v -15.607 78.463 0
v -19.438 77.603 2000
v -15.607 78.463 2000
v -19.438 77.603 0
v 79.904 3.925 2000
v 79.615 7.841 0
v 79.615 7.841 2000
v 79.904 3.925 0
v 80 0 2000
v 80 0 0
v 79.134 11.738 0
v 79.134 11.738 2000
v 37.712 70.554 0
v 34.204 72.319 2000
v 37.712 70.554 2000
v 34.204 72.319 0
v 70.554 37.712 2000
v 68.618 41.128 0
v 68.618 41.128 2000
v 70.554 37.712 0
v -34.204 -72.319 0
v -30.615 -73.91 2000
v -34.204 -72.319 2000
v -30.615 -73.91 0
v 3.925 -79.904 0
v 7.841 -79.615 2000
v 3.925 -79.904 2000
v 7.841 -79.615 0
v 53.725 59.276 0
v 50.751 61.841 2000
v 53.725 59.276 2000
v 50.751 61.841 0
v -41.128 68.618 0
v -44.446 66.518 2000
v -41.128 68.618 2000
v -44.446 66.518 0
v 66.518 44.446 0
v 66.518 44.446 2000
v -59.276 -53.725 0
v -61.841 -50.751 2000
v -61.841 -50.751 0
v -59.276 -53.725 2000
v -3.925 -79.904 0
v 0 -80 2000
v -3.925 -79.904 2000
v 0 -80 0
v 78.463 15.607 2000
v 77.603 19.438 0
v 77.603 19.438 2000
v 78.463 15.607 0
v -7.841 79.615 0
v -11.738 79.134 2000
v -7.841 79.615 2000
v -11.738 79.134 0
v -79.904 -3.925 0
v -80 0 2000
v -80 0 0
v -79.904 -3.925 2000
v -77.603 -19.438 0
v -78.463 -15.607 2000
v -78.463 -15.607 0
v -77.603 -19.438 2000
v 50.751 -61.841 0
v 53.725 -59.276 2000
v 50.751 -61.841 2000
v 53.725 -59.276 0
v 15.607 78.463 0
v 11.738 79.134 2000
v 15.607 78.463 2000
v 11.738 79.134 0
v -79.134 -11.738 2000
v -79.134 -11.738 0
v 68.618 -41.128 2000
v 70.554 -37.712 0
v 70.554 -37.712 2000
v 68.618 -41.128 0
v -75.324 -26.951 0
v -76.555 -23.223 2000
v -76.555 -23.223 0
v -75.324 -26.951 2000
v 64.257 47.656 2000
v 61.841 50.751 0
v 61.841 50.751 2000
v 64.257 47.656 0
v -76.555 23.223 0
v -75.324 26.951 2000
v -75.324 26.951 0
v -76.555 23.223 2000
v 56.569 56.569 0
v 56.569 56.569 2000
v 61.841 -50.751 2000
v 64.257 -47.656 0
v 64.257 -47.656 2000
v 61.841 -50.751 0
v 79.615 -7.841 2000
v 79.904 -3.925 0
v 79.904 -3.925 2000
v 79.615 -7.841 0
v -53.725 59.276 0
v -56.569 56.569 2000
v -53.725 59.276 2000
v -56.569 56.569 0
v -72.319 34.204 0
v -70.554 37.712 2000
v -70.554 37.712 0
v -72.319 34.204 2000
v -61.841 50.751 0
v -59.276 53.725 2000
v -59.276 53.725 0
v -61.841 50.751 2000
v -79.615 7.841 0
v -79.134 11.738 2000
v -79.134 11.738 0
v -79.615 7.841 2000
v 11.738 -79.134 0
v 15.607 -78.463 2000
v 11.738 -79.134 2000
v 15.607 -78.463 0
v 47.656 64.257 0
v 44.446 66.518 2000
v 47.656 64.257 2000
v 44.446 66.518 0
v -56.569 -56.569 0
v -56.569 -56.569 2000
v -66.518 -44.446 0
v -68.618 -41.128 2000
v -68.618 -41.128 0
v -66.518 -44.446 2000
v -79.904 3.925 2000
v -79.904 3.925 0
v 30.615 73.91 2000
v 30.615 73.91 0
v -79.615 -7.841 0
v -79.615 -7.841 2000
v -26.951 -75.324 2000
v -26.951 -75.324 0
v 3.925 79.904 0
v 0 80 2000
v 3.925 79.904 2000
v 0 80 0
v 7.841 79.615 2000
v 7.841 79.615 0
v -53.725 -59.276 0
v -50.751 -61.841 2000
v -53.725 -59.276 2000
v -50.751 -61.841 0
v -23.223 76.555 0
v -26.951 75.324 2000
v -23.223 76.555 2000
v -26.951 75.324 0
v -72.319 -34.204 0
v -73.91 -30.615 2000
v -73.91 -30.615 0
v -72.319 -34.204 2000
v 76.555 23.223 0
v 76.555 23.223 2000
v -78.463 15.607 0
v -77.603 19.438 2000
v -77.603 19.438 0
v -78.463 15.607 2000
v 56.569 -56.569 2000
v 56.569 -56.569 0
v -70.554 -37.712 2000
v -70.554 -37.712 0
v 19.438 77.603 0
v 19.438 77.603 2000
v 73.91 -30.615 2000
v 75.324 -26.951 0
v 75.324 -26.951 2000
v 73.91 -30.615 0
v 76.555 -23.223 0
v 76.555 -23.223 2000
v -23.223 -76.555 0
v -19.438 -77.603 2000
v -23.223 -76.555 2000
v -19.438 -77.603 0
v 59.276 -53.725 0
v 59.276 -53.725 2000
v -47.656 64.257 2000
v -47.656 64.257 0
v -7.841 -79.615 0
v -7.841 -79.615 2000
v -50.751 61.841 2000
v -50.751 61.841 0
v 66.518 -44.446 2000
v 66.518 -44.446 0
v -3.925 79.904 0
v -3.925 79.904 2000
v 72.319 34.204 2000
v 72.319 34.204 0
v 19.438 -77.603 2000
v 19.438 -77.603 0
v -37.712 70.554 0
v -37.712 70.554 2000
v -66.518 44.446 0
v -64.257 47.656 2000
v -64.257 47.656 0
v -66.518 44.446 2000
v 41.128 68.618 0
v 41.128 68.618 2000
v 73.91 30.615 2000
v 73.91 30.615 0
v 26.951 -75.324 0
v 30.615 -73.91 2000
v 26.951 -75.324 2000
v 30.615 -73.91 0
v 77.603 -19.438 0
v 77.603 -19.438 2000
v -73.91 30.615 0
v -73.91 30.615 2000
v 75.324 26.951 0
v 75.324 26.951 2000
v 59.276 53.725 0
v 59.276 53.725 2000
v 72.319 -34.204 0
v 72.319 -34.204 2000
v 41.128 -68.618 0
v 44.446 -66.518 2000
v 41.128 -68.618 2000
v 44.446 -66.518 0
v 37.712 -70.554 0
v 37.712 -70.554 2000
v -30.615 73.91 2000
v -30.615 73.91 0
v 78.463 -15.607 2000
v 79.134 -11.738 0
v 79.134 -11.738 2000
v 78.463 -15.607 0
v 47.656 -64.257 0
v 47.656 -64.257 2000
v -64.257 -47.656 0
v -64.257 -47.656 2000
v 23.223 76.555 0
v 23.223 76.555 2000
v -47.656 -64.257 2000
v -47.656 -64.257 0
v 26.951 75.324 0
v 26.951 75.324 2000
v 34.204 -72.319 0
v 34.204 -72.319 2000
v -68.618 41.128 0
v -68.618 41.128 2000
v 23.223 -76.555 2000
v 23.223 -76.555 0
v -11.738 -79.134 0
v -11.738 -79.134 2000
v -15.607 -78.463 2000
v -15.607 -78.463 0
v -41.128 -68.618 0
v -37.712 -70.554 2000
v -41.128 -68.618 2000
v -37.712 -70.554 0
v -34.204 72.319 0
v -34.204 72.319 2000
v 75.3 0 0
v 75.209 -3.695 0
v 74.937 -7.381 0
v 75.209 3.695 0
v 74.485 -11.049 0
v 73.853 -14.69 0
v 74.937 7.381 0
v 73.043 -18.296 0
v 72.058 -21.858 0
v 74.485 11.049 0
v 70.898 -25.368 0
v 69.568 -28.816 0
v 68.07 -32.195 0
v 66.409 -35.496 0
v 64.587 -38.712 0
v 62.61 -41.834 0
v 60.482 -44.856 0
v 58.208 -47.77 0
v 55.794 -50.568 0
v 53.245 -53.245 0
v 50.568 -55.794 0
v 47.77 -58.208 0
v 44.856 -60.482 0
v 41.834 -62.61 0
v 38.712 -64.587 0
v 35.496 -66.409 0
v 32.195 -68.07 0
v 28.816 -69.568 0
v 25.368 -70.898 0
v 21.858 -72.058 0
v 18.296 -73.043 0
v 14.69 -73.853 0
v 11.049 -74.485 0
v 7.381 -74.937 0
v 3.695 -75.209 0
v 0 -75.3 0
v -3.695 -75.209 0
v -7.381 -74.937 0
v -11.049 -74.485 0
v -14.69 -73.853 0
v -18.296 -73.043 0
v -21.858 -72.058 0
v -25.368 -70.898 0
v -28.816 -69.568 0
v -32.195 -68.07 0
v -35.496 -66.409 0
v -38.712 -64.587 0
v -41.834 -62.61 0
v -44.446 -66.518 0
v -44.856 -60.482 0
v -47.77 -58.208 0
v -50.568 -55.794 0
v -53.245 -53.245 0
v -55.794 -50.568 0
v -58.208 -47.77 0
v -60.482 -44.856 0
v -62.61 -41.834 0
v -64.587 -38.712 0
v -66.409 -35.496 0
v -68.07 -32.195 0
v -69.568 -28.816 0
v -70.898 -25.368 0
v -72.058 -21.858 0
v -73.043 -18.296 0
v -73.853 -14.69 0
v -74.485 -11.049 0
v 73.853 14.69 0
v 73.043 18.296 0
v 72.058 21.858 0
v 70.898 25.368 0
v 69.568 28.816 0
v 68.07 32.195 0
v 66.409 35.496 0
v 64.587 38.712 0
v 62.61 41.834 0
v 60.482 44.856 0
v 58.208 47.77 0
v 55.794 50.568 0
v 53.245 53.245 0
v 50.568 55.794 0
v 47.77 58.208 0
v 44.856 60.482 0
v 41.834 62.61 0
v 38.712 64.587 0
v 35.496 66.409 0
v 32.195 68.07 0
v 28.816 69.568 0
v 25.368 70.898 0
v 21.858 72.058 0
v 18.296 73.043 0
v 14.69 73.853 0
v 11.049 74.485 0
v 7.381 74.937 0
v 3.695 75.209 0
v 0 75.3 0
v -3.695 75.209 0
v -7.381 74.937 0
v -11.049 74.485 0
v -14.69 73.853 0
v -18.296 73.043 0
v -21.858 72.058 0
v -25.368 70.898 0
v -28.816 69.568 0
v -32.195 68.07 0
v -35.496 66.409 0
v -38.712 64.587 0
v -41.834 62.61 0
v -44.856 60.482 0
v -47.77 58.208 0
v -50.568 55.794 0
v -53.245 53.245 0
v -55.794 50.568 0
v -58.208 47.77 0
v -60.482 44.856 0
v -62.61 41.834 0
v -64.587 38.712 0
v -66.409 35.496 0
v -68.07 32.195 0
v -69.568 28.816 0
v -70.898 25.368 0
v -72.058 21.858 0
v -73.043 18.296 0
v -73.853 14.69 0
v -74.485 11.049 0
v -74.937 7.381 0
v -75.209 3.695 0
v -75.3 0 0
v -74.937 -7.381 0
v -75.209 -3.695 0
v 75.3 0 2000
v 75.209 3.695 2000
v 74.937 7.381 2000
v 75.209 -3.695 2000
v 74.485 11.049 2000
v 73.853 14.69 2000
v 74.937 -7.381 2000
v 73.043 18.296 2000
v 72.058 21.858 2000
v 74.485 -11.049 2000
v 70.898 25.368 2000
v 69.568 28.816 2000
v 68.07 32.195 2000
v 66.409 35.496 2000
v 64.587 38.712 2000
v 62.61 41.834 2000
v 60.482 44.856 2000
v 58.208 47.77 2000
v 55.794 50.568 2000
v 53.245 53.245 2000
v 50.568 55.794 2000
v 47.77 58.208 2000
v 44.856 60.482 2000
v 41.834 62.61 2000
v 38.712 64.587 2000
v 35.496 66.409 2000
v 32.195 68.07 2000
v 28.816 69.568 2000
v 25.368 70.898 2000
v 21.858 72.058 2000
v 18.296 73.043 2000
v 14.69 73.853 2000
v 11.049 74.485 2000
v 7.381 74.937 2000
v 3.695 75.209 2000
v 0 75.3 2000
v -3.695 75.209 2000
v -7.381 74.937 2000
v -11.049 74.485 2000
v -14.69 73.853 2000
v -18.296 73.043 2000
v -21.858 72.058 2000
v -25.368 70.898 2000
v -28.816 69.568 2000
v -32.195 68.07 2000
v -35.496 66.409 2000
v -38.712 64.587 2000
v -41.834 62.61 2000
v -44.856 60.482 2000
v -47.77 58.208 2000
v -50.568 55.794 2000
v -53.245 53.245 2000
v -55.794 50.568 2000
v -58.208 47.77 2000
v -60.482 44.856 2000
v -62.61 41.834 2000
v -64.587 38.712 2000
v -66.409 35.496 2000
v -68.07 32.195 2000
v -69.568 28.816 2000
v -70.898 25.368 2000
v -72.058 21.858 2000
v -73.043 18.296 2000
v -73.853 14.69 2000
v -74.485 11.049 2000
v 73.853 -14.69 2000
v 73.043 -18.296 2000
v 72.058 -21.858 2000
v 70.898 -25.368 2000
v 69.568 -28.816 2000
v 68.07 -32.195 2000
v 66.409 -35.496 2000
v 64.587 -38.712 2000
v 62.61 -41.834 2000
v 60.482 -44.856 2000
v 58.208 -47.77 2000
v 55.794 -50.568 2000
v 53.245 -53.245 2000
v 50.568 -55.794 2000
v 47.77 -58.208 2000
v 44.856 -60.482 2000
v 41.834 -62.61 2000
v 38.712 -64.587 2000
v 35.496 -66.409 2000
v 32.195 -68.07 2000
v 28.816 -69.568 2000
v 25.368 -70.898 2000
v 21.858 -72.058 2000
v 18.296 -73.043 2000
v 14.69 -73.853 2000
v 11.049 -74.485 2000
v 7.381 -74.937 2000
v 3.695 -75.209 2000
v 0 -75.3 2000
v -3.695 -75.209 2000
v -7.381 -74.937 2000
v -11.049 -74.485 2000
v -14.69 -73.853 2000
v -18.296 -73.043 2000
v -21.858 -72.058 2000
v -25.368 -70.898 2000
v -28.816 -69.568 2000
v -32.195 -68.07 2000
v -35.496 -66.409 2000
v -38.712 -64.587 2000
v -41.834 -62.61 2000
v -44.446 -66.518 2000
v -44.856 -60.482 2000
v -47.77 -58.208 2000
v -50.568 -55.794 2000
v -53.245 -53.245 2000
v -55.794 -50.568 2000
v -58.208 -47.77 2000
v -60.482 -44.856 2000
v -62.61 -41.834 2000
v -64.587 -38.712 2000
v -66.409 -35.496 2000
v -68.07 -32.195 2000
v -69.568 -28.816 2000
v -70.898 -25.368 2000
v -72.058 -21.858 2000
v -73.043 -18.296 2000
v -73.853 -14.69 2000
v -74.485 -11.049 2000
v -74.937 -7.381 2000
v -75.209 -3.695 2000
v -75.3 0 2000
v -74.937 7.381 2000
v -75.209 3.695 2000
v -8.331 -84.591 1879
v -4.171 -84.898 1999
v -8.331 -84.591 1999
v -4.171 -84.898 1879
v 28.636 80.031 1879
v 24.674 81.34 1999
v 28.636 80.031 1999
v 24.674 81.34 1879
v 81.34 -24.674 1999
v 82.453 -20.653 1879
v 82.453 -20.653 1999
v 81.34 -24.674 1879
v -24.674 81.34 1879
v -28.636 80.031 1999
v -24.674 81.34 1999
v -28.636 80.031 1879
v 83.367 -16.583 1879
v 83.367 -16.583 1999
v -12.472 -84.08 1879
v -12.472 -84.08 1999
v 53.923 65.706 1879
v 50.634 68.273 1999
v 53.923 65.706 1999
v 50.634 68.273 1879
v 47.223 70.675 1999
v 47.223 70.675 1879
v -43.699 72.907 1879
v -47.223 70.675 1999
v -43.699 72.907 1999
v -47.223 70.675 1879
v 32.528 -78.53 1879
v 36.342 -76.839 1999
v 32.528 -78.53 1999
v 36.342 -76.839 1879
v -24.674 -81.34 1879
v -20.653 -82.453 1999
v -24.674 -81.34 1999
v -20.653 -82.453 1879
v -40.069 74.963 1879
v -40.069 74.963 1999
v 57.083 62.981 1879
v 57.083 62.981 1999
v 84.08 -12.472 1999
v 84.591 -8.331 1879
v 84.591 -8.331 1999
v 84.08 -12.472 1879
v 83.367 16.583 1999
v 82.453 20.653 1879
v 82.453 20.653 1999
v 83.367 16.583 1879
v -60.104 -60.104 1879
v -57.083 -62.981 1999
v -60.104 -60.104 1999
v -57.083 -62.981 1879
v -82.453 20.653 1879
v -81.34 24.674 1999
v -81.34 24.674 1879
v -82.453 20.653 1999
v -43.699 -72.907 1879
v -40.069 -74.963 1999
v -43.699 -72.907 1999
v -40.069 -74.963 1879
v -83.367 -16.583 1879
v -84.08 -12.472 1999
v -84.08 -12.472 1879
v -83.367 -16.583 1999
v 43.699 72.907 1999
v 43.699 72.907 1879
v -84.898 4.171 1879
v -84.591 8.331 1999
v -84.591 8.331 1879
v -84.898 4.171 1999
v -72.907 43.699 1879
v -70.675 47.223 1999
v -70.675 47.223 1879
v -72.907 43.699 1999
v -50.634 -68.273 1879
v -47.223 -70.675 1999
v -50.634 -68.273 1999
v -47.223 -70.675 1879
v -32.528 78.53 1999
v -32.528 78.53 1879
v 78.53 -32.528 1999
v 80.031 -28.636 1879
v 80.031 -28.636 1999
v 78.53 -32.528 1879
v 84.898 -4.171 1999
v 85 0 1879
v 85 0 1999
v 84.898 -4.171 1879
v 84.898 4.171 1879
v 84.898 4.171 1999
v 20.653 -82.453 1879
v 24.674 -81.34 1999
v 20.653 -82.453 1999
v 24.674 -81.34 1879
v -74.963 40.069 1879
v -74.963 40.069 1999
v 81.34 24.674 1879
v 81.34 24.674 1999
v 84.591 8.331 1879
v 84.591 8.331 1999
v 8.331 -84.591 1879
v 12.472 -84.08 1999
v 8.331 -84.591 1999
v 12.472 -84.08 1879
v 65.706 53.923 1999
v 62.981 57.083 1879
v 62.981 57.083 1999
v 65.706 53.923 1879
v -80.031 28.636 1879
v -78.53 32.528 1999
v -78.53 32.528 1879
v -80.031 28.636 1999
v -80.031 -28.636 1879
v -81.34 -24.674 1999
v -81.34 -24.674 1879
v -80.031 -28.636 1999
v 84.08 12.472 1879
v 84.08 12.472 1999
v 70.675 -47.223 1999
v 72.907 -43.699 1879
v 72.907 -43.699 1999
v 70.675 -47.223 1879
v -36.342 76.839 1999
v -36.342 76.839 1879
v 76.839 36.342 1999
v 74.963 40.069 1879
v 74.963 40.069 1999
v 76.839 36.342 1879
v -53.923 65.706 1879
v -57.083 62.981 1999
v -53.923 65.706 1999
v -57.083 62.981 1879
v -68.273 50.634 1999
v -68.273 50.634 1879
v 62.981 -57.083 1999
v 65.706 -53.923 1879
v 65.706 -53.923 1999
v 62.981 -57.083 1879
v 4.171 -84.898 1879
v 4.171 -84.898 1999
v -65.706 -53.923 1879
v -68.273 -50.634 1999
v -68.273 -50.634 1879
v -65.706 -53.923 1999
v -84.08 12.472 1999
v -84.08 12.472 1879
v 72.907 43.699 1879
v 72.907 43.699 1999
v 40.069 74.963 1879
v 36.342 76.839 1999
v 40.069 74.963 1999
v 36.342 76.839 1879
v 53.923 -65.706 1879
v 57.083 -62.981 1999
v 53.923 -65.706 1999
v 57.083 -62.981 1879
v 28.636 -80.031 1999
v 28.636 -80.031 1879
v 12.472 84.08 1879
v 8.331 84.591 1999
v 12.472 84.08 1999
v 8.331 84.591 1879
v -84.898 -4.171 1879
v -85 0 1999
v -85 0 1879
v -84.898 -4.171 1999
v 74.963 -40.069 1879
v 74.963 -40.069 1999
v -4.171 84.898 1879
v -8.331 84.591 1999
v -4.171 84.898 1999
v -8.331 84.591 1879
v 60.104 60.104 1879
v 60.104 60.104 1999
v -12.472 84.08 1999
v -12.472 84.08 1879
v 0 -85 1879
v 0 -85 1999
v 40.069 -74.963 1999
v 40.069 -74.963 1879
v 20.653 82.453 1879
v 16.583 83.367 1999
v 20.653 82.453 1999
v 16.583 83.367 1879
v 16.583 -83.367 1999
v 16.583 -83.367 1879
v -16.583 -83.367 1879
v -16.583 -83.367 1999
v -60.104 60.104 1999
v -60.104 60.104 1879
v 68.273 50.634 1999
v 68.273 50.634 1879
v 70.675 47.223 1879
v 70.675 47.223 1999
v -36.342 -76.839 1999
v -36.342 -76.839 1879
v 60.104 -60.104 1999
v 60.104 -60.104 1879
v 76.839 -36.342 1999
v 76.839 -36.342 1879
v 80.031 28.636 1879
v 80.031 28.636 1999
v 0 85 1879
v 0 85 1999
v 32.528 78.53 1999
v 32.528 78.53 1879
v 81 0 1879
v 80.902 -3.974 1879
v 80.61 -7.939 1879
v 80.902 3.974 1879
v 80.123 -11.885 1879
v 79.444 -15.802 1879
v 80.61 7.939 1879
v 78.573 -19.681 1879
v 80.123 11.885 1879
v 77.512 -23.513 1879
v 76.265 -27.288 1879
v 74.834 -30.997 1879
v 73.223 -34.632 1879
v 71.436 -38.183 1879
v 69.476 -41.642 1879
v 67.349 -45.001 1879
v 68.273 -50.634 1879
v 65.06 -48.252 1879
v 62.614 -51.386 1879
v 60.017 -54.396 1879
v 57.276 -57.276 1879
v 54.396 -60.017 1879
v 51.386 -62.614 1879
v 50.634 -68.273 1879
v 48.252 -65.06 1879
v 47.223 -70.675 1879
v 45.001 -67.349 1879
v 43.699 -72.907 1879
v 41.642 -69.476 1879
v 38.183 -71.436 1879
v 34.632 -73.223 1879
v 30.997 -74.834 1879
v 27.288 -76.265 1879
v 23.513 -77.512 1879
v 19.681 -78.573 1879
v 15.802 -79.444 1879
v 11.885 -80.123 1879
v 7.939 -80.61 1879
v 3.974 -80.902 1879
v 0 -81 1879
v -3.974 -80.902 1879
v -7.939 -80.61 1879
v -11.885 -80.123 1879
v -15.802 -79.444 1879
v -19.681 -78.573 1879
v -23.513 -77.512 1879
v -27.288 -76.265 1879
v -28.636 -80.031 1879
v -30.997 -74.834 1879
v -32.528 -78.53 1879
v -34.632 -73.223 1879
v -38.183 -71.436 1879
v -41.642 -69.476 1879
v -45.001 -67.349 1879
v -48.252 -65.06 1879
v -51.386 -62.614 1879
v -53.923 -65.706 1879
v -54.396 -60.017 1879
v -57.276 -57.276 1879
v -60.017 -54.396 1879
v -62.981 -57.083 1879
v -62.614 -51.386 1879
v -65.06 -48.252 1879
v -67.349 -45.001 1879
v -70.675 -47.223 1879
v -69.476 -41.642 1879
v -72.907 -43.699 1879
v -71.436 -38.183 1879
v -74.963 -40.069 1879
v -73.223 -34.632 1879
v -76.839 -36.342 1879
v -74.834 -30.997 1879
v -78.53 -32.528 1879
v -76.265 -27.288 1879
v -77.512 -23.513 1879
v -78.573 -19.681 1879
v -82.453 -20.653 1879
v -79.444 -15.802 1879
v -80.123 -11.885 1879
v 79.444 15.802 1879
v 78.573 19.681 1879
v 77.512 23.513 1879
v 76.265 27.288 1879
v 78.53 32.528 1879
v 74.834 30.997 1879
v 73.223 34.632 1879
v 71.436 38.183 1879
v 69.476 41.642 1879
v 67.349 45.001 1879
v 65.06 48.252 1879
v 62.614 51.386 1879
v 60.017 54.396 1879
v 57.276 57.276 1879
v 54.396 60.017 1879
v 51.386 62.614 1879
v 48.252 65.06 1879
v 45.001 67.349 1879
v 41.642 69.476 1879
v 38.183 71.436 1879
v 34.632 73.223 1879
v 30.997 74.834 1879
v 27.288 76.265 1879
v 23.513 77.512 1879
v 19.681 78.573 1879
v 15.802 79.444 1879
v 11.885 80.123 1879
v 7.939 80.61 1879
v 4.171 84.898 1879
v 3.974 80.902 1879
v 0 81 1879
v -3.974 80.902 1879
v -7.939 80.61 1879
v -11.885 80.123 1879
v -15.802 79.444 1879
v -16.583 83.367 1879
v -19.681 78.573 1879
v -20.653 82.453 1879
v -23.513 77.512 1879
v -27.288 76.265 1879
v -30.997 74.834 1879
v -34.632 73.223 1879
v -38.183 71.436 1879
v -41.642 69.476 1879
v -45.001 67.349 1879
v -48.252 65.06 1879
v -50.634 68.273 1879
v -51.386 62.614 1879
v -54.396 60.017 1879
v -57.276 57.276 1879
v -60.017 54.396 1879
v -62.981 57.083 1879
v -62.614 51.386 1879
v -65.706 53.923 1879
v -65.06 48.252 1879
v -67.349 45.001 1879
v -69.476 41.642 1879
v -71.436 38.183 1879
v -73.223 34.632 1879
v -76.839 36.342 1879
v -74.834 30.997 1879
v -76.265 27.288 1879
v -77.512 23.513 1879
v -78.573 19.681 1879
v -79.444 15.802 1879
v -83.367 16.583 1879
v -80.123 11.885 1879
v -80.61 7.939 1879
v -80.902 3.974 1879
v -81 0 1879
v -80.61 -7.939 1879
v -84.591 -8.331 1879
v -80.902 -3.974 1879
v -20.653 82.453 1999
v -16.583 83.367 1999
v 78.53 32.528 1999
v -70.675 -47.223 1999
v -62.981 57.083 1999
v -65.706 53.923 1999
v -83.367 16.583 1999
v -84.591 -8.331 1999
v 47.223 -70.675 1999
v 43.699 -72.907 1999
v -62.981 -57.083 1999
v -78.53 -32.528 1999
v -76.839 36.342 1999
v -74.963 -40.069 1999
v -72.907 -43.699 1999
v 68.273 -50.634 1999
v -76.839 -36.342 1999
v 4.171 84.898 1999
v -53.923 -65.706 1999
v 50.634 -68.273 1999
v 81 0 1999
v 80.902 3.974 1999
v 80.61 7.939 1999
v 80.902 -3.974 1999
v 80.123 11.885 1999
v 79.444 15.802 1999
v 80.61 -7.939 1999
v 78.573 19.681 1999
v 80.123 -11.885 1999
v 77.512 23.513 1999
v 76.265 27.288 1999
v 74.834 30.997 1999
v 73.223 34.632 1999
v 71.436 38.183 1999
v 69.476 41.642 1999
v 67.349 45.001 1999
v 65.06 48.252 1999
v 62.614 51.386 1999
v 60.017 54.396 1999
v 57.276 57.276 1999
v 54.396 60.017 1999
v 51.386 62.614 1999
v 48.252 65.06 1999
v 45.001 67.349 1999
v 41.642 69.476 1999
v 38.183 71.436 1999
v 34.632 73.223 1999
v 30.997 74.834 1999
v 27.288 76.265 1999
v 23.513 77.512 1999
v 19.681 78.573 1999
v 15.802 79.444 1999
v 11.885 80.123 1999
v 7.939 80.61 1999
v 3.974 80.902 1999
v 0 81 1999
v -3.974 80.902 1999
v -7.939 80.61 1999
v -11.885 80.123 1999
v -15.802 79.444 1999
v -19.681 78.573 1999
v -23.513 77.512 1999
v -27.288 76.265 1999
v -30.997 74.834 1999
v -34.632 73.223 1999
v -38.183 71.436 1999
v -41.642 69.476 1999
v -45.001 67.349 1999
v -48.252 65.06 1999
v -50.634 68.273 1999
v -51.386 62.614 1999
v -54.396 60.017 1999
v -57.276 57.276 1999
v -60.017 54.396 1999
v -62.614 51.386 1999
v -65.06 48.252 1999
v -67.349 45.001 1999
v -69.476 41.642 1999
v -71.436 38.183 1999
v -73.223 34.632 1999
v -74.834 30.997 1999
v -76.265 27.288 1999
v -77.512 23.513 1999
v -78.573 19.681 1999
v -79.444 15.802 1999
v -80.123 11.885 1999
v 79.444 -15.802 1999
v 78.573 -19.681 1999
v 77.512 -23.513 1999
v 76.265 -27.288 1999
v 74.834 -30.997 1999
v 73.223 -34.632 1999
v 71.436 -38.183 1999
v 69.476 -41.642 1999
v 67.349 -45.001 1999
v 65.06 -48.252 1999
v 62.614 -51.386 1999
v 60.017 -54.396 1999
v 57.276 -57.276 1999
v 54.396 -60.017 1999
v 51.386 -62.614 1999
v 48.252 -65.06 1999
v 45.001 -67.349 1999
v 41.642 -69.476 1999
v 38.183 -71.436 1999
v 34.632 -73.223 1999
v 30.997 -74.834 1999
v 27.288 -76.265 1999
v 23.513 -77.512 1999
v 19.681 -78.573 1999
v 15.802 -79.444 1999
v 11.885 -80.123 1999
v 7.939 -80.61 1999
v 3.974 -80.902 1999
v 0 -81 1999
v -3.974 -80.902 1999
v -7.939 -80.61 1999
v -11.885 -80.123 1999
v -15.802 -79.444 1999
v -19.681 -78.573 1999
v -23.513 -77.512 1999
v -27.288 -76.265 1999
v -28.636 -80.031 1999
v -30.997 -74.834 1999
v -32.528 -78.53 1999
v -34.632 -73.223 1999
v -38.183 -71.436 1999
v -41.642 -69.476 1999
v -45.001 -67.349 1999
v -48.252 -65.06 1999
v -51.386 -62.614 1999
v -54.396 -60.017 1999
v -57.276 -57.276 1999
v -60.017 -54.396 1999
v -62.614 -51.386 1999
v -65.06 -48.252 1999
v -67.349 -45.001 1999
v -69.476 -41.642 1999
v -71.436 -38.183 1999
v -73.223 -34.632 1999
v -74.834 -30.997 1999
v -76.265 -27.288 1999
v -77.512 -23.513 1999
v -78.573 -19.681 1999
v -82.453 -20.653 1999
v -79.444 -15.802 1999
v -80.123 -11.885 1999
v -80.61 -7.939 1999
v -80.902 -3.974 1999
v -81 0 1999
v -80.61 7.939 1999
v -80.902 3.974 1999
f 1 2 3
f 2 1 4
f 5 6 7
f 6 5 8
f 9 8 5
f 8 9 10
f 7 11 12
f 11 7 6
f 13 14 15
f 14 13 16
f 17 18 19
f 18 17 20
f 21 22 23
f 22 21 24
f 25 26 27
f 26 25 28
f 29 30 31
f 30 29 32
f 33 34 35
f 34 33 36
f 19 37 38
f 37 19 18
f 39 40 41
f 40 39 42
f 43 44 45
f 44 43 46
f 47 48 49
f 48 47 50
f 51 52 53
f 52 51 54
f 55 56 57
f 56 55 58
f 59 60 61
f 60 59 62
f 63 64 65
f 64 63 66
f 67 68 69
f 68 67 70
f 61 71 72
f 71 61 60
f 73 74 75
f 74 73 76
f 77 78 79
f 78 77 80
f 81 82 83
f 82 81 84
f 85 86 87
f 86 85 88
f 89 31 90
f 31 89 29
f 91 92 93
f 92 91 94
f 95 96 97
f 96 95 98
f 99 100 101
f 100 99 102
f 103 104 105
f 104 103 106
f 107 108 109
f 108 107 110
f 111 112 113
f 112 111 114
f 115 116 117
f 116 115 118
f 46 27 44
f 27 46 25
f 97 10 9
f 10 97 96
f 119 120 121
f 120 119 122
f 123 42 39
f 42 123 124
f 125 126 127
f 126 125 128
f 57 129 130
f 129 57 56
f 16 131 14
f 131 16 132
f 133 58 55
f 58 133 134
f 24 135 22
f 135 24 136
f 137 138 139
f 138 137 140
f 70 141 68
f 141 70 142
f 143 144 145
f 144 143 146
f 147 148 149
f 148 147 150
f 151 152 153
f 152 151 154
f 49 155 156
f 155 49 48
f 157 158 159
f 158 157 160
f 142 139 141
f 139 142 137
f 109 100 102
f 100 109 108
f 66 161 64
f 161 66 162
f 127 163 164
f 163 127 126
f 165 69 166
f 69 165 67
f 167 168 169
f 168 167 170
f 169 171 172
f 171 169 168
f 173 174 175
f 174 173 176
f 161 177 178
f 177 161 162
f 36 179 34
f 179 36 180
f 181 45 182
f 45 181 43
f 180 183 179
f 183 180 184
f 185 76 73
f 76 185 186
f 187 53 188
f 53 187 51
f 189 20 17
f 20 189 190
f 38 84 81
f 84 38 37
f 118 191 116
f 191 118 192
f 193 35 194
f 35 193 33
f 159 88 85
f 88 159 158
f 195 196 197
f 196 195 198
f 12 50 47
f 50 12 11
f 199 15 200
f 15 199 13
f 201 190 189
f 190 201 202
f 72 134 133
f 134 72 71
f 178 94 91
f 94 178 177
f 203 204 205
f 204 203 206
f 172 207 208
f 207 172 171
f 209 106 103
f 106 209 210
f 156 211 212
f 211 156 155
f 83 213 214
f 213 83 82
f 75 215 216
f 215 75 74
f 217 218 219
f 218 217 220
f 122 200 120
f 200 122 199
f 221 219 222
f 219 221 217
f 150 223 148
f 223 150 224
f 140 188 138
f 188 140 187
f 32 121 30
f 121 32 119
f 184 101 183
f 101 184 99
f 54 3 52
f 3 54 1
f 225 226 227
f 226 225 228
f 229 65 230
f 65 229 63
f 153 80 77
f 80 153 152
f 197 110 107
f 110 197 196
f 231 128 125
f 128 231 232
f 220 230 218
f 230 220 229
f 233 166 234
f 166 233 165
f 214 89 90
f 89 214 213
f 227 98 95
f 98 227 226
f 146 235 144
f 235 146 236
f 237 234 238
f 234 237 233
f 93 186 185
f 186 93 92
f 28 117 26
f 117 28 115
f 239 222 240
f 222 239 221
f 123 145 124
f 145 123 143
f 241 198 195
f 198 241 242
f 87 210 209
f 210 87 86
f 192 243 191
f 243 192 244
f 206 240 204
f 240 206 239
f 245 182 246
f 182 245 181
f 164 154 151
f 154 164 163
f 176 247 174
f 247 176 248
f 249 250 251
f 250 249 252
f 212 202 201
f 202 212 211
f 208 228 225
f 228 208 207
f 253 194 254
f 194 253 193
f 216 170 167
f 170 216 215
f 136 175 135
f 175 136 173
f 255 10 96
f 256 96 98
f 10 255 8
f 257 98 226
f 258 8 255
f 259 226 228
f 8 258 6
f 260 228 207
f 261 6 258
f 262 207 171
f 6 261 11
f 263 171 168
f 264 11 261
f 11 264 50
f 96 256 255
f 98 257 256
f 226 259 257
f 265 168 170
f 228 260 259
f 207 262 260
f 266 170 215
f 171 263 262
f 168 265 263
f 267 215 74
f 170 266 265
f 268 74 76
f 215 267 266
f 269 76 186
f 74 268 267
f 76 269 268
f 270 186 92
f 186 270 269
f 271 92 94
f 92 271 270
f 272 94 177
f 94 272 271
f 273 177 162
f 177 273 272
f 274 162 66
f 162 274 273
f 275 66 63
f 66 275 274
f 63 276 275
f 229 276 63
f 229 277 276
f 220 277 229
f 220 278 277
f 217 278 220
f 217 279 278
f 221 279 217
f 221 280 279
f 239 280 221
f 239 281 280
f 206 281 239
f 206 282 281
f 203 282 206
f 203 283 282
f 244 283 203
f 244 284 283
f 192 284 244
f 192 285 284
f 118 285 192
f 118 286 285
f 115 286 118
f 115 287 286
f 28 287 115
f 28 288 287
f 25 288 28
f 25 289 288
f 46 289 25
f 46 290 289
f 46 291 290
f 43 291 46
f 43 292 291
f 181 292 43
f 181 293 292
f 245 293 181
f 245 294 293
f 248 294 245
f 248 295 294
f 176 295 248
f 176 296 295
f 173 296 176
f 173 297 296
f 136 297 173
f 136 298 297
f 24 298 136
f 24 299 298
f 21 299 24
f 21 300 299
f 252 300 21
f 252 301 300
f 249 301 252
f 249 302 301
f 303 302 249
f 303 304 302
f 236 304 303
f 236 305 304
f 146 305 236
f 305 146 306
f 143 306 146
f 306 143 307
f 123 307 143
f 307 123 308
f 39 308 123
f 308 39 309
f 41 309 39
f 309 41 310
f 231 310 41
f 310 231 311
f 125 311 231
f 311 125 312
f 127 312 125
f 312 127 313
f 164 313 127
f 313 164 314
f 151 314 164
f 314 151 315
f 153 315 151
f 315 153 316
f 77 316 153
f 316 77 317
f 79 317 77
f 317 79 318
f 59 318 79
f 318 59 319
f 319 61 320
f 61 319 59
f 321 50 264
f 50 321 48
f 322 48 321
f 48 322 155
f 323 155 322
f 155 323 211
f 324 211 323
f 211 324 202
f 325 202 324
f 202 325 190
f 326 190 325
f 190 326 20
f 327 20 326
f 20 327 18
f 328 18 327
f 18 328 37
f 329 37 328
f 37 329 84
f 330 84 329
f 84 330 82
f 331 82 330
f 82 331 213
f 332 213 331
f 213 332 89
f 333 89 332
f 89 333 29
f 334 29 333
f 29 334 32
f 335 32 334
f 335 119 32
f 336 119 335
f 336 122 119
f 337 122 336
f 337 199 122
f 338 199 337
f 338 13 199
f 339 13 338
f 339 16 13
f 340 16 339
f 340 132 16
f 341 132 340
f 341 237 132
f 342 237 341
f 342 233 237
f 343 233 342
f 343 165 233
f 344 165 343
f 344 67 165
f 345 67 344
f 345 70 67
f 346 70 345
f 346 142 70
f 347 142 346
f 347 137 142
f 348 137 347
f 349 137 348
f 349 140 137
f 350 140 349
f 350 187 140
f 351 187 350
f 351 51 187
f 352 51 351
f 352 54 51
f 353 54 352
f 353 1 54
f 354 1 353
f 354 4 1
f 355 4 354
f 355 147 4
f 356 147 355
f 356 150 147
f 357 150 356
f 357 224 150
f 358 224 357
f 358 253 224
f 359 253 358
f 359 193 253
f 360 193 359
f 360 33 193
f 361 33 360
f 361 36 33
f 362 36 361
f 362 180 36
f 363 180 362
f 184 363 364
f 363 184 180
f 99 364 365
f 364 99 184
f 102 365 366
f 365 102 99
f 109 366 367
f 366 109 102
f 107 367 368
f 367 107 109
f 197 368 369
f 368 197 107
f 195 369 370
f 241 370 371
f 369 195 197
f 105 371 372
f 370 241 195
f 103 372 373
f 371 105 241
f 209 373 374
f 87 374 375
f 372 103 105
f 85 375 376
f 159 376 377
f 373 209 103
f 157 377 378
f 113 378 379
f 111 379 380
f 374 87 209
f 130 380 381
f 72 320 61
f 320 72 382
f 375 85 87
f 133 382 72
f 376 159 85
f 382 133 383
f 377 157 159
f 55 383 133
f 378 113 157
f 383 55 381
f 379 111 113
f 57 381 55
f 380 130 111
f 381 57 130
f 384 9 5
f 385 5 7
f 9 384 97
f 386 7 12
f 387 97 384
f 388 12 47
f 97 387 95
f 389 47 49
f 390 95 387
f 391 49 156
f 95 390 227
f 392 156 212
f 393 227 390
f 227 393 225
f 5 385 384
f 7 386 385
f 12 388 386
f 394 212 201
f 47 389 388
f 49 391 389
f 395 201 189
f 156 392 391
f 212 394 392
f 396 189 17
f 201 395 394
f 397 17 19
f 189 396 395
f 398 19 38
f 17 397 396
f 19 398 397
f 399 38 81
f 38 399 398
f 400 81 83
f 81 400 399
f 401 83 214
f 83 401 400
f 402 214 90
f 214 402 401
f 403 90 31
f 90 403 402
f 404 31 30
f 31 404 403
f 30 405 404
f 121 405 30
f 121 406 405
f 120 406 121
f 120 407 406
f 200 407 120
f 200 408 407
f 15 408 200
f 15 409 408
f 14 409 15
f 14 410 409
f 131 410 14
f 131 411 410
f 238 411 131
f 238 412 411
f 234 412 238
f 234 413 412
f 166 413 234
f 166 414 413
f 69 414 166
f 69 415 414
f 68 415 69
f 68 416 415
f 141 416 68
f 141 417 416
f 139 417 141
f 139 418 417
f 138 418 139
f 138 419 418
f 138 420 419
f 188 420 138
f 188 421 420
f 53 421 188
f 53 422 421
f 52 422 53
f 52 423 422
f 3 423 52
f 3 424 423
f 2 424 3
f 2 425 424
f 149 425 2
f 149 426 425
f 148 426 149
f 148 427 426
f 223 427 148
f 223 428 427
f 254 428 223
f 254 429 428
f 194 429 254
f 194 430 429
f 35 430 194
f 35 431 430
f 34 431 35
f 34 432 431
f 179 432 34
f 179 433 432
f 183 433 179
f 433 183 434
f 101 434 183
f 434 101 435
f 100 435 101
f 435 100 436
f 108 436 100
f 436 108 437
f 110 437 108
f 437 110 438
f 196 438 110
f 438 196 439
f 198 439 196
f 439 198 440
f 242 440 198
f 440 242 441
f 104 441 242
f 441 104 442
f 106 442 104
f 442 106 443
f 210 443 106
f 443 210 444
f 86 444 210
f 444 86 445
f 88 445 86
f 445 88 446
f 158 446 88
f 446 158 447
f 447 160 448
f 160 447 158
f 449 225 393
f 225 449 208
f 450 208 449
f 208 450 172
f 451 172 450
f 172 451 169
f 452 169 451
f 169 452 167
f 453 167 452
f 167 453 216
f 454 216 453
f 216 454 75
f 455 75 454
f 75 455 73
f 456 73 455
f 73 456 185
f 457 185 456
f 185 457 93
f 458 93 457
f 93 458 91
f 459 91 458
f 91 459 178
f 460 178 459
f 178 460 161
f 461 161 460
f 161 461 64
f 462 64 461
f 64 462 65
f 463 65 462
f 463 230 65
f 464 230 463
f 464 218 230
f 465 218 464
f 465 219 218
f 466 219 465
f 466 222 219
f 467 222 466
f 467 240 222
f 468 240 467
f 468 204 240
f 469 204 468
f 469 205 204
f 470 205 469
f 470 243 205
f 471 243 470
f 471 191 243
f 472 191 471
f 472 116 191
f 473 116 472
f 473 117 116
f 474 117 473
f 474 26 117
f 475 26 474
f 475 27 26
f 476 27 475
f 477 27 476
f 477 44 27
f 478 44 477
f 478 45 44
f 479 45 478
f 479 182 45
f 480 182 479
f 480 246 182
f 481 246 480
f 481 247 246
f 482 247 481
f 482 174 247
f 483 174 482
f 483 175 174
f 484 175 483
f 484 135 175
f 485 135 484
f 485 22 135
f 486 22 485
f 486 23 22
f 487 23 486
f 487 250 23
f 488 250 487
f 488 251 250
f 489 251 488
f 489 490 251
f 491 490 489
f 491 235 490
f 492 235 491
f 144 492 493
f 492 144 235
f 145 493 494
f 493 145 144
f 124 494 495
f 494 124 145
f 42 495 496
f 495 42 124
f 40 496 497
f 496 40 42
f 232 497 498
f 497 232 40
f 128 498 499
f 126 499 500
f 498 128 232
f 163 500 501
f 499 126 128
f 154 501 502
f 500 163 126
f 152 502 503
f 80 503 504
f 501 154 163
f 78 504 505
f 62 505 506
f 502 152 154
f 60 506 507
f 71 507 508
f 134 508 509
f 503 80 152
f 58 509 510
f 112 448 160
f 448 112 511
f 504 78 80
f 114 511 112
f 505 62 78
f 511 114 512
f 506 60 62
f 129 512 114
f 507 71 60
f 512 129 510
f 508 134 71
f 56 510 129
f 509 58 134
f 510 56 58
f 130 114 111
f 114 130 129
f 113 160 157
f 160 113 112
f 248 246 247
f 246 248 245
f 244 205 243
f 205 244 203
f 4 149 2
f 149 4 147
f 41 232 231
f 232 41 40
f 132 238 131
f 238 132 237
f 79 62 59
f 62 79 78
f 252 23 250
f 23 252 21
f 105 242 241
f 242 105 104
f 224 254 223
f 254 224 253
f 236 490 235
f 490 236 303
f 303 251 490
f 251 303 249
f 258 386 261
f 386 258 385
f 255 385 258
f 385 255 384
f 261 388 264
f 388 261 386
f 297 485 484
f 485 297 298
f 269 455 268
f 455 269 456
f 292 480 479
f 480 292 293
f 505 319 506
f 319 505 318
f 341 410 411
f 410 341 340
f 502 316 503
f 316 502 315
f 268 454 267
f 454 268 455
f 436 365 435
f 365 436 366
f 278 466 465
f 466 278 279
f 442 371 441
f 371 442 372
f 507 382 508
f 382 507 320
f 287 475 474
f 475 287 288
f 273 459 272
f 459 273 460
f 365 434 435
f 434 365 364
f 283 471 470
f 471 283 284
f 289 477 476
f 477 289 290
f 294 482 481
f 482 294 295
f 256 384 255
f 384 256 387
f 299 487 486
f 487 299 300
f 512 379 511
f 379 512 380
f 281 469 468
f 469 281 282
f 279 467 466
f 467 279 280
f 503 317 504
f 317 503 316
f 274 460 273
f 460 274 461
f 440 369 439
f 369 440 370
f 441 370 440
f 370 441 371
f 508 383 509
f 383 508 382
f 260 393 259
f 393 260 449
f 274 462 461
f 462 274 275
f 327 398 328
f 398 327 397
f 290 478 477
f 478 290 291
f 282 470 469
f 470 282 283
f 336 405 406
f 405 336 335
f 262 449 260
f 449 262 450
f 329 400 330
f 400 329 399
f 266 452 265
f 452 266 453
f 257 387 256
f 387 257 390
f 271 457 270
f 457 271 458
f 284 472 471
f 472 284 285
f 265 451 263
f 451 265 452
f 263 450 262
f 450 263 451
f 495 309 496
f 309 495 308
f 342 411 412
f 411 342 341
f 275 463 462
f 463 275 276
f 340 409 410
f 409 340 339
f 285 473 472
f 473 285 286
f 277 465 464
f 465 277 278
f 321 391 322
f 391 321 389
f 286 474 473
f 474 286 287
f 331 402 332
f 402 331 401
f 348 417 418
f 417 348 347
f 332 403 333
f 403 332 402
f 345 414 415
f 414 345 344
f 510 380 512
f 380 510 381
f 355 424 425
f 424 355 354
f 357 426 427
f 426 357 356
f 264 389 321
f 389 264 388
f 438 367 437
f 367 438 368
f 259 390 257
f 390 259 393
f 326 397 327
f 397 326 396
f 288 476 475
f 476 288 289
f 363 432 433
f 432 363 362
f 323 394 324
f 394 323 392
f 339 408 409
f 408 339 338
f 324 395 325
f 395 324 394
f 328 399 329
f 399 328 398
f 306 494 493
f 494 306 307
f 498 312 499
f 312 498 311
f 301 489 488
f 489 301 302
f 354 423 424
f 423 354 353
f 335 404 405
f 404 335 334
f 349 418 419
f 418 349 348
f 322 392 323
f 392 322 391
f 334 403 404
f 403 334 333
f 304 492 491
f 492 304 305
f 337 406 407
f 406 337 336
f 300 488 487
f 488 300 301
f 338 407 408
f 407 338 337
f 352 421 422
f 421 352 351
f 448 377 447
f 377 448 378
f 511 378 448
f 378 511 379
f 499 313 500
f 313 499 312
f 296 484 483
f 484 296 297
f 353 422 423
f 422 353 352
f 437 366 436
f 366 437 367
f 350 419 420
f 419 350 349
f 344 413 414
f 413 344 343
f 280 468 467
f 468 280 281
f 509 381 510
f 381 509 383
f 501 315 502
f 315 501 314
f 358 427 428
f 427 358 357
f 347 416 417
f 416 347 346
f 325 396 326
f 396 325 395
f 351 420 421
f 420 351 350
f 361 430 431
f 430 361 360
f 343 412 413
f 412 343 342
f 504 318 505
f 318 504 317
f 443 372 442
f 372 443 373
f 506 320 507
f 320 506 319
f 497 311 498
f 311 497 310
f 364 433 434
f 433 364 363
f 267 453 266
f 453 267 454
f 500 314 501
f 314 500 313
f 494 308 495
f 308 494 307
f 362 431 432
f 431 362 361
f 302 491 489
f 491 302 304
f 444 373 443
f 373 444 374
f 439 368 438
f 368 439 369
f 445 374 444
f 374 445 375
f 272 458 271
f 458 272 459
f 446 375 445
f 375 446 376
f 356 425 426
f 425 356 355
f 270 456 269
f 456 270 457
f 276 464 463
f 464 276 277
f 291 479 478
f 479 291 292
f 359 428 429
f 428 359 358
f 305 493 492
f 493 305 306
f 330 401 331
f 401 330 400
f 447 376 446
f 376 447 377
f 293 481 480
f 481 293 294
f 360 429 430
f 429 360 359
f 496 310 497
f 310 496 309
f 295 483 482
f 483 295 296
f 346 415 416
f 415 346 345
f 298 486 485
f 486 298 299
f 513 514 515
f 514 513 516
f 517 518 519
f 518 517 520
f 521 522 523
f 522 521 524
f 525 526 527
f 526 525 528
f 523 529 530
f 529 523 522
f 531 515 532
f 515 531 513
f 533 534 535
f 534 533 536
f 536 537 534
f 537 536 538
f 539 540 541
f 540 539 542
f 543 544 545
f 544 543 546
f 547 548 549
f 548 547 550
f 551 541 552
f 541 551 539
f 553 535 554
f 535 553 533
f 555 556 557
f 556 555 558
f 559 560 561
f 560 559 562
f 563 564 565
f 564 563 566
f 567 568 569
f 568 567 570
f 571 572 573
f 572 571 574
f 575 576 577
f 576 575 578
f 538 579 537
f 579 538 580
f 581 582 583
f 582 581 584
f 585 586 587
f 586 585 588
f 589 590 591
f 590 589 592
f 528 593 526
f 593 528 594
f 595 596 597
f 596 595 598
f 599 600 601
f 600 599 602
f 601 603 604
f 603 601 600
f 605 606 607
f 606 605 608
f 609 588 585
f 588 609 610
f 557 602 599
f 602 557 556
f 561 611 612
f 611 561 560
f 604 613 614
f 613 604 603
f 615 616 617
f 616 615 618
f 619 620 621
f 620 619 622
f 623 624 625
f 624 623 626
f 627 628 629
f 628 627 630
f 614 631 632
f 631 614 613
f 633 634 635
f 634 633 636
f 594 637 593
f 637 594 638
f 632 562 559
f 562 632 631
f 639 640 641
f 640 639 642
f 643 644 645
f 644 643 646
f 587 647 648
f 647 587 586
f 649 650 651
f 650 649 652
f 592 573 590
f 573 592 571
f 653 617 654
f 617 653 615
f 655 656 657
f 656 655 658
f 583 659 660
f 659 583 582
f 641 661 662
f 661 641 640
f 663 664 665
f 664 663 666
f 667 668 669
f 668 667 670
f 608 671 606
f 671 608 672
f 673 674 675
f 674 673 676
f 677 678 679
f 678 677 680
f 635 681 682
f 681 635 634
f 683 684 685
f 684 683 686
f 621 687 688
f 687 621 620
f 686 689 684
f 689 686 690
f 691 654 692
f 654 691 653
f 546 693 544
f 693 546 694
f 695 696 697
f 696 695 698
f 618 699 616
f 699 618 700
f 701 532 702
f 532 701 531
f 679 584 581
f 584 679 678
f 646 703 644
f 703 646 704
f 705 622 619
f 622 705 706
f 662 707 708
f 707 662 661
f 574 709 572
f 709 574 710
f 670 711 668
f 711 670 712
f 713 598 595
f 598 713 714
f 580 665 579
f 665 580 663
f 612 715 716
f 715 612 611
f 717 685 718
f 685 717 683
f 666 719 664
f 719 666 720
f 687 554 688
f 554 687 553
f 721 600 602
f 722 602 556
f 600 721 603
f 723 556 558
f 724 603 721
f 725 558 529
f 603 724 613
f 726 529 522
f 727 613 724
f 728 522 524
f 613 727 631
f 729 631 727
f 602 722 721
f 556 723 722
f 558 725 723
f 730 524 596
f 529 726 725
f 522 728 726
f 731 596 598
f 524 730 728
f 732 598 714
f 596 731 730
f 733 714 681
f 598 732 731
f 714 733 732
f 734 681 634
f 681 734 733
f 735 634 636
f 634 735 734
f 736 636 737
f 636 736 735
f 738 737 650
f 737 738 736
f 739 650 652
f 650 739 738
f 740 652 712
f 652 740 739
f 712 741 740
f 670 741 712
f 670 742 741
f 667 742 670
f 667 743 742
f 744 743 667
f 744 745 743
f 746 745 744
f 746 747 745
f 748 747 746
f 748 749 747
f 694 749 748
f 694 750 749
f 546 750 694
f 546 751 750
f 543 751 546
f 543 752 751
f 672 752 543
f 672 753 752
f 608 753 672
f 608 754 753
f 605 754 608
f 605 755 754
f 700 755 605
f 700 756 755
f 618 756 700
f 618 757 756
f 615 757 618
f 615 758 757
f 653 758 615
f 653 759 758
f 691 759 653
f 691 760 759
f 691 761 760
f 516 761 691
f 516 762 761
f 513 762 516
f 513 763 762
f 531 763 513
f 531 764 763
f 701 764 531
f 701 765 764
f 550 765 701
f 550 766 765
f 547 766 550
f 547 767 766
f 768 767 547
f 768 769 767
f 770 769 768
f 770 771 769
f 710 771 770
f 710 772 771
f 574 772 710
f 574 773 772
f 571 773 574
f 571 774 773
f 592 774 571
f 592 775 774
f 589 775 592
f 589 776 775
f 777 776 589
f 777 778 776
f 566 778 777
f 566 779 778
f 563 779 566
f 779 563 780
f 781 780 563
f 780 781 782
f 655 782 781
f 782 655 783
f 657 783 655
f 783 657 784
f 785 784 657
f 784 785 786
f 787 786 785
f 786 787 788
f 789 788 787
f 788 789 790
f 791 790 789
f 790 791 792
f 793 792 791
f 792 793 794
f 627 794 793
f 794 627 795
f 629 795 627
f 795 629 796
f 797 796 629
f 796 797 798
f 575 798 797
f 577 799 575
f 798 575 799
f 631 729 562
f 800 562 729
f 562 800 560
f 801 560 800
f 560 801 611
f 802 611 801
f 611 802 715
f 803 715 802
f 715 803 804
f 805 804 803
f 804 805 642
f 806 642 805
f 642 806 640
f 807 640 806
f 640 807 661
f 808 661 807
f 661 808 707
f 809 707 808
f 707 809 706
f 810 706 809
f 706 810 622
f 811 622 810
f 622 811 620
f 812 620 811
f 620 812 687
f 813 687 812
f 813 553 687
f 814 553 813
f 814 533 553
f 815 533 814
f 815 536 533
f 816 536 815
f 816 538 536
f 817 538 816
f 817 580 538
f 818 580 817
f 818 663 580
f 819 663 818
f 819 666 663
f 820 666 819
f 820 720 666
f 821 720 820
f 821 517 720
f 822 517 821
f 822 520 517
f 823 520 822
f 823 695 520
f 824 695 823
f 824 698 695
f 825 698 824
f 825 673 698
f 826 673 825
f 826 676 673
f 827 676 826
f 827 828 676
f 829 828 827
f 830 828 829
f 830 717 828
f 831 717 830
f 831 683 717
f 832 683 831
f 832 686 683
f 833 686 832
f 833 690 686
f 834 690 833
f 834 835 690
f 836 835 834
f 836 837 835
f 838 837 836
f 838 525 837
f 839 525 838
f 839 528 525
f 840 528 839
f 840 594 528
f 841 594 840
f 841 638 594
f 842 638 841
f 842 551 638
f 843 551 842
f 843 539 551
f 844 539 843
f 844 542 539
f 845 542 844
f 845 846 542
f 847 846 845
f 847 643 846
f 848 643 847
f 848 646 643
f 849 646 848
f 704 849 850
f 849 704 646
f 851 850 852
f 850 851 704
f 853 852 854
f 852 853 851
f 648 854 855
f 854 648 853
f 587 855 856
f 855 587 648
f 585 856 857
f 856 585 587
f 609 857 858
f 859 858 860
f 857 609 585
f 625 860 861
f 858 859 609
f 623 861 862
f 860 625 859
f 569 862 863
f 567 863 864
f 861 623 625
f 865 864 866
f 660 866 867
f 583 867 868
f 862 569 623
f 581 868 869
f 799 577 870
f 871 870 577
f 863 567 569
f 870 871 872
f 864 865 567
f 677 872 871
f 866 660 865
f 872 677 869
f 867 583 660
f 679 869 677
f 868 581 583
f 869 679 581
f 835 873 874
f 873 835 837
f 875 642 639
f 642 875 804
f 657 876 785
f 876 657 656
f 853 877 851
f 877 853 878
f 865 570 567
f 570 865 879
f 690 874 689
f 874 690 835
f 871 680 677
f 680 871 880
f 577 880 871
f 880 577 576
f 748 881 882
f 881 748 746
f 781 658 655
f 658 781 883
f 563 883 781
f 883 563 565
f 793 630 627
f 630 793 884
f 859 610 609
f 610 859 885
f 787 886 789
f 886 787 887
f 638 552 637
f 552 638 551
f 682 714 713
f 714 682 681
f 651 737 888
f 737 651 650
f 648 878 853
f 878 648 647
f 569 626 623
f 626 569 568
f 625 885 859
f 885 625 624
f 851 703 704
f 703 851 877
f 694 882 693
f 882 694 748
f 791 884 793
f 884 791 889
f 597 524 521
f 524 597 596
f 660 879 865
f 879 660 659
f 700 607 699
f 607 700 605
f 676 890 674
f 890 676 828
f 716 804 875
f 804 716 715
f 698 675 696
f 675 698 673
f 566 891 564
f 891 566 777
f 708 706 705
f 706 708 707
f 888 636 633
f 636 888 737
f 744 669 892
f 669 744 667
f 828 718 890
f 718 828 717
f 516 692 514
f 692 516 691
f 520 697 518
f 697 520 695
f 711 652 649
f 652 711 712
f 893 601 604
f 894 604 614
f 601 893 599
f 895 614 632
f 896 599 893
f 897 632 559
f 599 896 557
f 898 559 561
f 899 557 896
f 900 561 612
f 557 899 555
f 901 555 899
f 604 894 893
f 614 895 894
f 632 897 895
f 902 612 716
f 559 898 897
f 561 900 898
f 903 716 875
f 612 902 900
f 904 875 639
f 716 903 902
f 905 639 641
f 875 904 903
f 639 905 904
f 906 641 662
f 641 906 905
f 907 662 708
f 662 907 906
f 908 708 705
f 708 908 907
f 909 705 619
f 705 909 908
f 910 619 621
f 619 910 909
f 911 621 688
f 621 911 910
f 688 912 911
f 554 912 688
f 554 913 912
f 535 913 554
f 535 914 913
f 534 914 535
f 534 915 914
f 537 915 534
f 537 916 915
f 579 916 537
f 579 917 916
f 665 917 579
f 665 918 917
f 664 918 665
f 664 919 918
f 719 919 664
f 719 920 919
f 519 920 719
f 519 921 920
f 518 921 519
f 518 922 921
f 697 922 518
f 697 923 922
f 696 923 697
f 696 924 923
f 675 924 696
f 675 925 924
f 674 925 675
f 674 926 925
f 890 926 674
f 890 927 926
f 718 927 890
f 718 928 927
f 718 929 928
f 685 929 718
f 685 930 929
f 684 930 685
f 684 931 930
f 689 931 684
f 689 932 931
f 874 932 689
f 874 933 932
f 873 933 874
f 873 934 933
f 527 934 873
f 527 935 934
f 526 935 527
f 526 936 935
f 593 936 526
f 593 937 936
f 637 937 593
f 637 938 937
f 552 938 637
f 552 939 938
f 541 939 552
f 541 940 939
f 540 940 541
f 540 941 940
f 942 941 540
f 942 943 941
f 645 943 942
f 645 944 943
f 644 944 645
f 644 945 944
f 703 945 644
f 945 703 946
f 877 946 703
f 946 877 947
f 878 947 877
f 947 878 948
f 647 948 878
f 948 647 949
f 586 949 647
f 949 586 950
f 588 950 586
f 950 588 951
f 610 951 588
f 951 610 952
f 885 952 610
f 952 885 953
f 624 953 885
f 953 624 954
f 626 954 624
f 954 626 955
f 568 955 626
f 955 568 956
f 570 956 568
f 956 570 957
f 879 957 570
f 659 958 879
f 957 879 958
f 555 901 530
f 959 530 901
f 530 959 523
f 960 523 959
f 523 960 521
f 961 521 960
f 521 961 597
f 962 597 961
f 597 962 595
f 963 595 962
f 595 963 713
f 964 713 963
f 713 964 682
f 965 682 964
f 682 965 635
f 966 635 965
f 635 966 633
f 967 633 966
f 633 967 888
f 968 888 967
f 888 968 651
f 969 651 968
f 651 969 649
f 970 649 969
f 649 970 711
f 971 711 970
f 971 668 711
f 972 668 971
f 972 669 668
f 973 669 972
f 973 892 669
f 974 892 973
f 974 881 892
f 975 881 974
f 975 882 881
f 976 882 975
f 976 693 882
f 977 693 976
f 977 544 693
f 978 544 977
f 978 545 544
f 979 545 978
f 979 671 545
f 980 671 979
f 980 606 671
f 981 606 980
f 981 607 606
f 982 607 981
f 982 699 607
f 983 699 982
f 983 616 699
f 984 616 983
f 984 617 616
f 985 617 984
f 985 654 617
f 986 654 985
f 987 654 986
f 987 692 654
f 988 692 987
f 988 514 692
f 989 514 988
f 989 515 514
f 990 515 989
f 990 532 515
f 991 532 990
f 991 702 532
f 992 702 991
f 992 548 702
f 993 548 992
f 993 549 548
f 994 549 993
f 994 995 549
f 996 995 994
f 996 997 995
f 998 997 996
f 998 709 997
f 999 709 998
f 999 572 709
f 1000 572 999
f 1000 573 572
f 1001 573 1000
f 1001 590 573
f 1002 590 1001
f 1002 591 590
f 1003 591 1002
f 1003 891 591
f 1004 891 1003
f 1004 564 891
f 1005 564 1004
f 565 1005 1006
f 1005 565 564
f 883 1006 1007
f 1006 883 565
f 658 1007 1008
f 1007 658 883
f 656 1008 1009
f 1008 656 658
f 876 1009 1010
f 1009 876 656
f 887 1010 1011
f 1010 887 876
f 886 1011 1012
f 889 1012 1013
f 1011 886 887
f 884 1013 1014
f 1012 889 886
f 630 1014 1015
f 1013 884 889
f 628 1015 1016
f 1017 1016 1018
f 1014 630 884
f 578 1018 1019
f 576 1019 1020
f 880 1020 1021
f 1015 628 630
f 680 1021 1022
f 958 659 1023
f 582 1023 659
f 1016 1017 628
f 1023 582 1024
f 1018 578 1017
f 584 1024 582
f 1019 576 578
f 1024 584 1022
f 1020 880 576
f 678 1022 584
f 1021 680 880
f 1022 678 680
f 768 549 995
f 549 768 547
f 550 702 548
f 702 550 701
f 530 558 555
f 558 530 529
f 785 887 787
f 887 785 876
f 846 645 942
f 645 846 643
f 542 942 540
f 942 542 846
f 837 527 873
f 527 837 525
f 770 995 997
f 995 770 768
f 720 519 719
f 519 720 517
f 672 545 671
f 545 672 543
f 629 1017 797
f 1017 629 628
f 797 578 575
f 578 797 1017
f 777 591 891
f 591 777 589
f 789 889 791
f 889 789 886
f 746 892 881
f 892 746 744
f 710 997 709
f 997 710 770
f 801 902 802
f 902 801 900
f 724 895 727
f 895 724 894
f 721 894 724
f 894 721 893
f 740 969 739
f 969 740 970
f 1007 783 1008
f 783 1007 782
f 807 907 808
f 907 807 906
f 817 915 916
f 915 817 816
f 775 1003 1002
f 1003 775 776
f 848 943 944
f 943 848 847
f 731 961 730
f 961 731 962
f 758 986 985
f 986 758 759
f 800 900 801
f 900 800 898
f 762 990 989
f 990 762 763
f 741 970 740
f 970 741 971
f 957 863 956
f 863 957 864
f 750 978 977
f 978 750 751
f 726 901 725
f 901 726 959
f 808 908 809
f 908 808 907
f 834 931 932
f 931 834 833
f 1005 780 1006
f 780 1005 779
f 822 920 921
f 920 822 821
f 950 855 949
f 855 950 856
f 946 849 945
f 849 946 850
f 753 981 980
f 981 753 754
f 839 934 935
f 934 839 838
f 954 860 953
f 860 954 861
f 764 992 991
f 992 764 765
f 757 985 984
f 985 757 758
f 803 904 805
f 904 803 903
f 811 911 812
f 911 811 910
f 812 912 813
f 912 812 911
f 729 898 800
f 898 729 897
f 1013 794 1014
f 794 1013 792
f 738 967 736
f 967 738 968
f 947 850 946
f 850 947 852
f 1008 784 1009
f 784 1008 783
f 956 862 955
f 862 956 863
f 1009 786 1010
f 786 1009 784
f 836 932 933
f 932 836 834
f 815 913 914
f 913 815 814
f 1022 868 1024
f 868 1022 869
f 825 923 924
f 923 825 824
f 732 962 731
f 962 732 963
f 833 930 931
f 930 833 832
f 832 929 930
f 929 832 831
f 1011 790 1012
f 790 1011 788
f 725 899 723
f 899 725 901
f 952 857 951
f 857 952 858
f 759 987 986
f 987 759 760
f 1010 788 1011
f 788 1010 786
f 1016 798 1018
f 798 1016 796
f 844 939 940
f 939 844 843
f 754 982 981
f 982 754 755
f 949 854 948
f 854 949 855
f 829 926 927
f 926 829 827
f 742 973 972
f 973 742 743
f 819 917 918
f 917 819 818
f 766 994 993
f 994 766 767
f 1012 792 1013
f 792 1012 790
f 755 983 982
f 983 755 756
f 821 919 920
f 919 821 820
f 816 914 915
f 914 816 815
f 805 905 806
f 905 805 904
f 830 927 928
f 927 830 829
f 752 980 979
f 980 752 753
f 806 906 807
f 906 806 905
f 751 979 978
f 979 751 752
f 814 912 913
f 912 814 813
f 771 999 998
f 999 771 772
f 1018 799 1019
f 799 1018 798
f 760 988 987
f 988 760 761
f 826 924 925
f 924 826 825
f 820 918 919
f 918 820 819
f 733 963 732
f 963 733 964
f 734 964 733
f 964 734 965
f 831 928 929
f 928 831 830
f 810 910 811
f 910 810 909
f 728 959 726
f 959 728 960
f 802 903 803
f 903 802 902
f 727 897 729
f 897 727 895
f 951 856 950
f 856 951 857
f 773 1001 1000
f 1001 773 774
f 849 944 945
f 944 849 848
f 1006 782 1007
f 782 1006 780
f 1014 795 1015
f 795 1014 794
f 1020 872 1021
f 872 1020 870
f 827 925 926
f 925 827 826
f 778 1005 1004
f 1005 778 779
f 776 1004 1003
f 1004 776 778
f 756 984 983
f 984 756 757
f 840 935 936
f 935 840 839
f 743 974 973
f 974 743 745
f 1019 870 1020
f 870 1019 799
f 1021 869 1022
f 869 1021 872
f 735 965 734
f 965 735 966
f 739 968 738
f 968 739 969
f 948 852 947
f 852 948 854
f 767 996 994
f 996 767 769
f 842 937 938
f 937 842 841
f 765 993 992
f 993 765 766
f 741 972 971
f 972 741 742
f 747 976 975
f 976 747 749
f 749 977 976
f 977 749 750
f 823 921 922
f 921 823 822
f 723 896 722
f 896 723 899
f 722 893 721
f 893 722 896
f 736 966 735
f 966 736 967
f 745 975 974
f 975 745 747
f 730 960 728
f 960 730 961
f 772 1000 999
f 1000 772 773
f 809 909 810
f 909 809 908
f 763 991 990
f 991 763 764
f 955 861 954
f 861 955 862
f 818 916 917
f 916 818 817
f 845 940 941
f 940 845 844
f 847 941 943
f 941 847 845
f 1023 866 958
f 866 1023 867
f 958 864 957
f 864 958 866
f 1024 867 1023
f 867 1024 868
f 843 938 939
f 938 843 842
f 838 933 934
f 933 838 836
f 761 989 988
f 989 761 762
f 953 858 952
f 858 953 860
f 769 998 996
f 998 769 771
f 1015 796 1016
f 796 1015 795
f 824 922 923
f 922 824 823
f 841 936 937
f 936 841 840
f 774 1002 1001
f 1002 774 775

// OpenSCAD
// HT 160 pipe 2000 mm (single connected solid)

// Parameters
pipe_standard = 1; //[1:1:1]
nominal_diameter_mm = 160; //[80:320:1]
length_mm = 2000; //[1000:4000:10]
outer_diameter_mm = 160; //[80:320:1]
wall_thickness_mm = 4.7; //[2.35:9.4:0.1]
include_end_fitting = 1; //[0:1:1]
fit_overlap_mm = 1; //[0.5:2:0.1]
fitting_length_mm = 120; //[60:240:1]
fitting_od_extra_mm = 10; //[4:25:0.5]
fitting_wall_extra_mm = 2; //[0.5:6:0.1]
fitting_bore_clearance_mm = 1; //[0.2:3:0.1]

$fn = 128;

// Helpers
eps = 0.05;

module ht_pipe() {
    // Derived dimensions (guard against invalid values)
    od = outer_diameter_mm;
    r_out = od/2;
    t = wall_thickness_mm;
    r_in = max(r_out - t, 0.1);

    fit_len = fitting_length_mm;
    overlap = fit_overlap_mm;

    // Fitting outer radius and inner bore radius
    r_fit_out = r_out + fitting_od_extra_mm/2;
    r_fit_bore = r_out + fitting_bore_clearance_mm; // socket bore for pipe OD

    // Place fitting so it overlaps the main pipe by 'overlap' (ensures connectivity)
    z_fit = length_mm - fit_len - overlap;

    color([0.85, 0.85, 0.8])
    union() {
        // Main pipe (hollow)
        difference() {
            cylinder(h=length_mm, r=r_out, center=false);
            translate([0, 0, -eps])
                cylinder(h=length_mm + 2*eps, r=r_in, center=false);
        }

        // End fitting (socket) - hollow ring that overlaps the pipe
        if (include_end_fitting) {
            translate([0, 0, z_fit])
            difference() {
                cylinder(h=fit_len, r=r_fit_out, center=false);
                translate([0, 0, -eps])
                    cylinder(h=fit_len + 2*eps, r=r_fit_bore, center=false);
            }
        }
    }
}

ht_pipe();
